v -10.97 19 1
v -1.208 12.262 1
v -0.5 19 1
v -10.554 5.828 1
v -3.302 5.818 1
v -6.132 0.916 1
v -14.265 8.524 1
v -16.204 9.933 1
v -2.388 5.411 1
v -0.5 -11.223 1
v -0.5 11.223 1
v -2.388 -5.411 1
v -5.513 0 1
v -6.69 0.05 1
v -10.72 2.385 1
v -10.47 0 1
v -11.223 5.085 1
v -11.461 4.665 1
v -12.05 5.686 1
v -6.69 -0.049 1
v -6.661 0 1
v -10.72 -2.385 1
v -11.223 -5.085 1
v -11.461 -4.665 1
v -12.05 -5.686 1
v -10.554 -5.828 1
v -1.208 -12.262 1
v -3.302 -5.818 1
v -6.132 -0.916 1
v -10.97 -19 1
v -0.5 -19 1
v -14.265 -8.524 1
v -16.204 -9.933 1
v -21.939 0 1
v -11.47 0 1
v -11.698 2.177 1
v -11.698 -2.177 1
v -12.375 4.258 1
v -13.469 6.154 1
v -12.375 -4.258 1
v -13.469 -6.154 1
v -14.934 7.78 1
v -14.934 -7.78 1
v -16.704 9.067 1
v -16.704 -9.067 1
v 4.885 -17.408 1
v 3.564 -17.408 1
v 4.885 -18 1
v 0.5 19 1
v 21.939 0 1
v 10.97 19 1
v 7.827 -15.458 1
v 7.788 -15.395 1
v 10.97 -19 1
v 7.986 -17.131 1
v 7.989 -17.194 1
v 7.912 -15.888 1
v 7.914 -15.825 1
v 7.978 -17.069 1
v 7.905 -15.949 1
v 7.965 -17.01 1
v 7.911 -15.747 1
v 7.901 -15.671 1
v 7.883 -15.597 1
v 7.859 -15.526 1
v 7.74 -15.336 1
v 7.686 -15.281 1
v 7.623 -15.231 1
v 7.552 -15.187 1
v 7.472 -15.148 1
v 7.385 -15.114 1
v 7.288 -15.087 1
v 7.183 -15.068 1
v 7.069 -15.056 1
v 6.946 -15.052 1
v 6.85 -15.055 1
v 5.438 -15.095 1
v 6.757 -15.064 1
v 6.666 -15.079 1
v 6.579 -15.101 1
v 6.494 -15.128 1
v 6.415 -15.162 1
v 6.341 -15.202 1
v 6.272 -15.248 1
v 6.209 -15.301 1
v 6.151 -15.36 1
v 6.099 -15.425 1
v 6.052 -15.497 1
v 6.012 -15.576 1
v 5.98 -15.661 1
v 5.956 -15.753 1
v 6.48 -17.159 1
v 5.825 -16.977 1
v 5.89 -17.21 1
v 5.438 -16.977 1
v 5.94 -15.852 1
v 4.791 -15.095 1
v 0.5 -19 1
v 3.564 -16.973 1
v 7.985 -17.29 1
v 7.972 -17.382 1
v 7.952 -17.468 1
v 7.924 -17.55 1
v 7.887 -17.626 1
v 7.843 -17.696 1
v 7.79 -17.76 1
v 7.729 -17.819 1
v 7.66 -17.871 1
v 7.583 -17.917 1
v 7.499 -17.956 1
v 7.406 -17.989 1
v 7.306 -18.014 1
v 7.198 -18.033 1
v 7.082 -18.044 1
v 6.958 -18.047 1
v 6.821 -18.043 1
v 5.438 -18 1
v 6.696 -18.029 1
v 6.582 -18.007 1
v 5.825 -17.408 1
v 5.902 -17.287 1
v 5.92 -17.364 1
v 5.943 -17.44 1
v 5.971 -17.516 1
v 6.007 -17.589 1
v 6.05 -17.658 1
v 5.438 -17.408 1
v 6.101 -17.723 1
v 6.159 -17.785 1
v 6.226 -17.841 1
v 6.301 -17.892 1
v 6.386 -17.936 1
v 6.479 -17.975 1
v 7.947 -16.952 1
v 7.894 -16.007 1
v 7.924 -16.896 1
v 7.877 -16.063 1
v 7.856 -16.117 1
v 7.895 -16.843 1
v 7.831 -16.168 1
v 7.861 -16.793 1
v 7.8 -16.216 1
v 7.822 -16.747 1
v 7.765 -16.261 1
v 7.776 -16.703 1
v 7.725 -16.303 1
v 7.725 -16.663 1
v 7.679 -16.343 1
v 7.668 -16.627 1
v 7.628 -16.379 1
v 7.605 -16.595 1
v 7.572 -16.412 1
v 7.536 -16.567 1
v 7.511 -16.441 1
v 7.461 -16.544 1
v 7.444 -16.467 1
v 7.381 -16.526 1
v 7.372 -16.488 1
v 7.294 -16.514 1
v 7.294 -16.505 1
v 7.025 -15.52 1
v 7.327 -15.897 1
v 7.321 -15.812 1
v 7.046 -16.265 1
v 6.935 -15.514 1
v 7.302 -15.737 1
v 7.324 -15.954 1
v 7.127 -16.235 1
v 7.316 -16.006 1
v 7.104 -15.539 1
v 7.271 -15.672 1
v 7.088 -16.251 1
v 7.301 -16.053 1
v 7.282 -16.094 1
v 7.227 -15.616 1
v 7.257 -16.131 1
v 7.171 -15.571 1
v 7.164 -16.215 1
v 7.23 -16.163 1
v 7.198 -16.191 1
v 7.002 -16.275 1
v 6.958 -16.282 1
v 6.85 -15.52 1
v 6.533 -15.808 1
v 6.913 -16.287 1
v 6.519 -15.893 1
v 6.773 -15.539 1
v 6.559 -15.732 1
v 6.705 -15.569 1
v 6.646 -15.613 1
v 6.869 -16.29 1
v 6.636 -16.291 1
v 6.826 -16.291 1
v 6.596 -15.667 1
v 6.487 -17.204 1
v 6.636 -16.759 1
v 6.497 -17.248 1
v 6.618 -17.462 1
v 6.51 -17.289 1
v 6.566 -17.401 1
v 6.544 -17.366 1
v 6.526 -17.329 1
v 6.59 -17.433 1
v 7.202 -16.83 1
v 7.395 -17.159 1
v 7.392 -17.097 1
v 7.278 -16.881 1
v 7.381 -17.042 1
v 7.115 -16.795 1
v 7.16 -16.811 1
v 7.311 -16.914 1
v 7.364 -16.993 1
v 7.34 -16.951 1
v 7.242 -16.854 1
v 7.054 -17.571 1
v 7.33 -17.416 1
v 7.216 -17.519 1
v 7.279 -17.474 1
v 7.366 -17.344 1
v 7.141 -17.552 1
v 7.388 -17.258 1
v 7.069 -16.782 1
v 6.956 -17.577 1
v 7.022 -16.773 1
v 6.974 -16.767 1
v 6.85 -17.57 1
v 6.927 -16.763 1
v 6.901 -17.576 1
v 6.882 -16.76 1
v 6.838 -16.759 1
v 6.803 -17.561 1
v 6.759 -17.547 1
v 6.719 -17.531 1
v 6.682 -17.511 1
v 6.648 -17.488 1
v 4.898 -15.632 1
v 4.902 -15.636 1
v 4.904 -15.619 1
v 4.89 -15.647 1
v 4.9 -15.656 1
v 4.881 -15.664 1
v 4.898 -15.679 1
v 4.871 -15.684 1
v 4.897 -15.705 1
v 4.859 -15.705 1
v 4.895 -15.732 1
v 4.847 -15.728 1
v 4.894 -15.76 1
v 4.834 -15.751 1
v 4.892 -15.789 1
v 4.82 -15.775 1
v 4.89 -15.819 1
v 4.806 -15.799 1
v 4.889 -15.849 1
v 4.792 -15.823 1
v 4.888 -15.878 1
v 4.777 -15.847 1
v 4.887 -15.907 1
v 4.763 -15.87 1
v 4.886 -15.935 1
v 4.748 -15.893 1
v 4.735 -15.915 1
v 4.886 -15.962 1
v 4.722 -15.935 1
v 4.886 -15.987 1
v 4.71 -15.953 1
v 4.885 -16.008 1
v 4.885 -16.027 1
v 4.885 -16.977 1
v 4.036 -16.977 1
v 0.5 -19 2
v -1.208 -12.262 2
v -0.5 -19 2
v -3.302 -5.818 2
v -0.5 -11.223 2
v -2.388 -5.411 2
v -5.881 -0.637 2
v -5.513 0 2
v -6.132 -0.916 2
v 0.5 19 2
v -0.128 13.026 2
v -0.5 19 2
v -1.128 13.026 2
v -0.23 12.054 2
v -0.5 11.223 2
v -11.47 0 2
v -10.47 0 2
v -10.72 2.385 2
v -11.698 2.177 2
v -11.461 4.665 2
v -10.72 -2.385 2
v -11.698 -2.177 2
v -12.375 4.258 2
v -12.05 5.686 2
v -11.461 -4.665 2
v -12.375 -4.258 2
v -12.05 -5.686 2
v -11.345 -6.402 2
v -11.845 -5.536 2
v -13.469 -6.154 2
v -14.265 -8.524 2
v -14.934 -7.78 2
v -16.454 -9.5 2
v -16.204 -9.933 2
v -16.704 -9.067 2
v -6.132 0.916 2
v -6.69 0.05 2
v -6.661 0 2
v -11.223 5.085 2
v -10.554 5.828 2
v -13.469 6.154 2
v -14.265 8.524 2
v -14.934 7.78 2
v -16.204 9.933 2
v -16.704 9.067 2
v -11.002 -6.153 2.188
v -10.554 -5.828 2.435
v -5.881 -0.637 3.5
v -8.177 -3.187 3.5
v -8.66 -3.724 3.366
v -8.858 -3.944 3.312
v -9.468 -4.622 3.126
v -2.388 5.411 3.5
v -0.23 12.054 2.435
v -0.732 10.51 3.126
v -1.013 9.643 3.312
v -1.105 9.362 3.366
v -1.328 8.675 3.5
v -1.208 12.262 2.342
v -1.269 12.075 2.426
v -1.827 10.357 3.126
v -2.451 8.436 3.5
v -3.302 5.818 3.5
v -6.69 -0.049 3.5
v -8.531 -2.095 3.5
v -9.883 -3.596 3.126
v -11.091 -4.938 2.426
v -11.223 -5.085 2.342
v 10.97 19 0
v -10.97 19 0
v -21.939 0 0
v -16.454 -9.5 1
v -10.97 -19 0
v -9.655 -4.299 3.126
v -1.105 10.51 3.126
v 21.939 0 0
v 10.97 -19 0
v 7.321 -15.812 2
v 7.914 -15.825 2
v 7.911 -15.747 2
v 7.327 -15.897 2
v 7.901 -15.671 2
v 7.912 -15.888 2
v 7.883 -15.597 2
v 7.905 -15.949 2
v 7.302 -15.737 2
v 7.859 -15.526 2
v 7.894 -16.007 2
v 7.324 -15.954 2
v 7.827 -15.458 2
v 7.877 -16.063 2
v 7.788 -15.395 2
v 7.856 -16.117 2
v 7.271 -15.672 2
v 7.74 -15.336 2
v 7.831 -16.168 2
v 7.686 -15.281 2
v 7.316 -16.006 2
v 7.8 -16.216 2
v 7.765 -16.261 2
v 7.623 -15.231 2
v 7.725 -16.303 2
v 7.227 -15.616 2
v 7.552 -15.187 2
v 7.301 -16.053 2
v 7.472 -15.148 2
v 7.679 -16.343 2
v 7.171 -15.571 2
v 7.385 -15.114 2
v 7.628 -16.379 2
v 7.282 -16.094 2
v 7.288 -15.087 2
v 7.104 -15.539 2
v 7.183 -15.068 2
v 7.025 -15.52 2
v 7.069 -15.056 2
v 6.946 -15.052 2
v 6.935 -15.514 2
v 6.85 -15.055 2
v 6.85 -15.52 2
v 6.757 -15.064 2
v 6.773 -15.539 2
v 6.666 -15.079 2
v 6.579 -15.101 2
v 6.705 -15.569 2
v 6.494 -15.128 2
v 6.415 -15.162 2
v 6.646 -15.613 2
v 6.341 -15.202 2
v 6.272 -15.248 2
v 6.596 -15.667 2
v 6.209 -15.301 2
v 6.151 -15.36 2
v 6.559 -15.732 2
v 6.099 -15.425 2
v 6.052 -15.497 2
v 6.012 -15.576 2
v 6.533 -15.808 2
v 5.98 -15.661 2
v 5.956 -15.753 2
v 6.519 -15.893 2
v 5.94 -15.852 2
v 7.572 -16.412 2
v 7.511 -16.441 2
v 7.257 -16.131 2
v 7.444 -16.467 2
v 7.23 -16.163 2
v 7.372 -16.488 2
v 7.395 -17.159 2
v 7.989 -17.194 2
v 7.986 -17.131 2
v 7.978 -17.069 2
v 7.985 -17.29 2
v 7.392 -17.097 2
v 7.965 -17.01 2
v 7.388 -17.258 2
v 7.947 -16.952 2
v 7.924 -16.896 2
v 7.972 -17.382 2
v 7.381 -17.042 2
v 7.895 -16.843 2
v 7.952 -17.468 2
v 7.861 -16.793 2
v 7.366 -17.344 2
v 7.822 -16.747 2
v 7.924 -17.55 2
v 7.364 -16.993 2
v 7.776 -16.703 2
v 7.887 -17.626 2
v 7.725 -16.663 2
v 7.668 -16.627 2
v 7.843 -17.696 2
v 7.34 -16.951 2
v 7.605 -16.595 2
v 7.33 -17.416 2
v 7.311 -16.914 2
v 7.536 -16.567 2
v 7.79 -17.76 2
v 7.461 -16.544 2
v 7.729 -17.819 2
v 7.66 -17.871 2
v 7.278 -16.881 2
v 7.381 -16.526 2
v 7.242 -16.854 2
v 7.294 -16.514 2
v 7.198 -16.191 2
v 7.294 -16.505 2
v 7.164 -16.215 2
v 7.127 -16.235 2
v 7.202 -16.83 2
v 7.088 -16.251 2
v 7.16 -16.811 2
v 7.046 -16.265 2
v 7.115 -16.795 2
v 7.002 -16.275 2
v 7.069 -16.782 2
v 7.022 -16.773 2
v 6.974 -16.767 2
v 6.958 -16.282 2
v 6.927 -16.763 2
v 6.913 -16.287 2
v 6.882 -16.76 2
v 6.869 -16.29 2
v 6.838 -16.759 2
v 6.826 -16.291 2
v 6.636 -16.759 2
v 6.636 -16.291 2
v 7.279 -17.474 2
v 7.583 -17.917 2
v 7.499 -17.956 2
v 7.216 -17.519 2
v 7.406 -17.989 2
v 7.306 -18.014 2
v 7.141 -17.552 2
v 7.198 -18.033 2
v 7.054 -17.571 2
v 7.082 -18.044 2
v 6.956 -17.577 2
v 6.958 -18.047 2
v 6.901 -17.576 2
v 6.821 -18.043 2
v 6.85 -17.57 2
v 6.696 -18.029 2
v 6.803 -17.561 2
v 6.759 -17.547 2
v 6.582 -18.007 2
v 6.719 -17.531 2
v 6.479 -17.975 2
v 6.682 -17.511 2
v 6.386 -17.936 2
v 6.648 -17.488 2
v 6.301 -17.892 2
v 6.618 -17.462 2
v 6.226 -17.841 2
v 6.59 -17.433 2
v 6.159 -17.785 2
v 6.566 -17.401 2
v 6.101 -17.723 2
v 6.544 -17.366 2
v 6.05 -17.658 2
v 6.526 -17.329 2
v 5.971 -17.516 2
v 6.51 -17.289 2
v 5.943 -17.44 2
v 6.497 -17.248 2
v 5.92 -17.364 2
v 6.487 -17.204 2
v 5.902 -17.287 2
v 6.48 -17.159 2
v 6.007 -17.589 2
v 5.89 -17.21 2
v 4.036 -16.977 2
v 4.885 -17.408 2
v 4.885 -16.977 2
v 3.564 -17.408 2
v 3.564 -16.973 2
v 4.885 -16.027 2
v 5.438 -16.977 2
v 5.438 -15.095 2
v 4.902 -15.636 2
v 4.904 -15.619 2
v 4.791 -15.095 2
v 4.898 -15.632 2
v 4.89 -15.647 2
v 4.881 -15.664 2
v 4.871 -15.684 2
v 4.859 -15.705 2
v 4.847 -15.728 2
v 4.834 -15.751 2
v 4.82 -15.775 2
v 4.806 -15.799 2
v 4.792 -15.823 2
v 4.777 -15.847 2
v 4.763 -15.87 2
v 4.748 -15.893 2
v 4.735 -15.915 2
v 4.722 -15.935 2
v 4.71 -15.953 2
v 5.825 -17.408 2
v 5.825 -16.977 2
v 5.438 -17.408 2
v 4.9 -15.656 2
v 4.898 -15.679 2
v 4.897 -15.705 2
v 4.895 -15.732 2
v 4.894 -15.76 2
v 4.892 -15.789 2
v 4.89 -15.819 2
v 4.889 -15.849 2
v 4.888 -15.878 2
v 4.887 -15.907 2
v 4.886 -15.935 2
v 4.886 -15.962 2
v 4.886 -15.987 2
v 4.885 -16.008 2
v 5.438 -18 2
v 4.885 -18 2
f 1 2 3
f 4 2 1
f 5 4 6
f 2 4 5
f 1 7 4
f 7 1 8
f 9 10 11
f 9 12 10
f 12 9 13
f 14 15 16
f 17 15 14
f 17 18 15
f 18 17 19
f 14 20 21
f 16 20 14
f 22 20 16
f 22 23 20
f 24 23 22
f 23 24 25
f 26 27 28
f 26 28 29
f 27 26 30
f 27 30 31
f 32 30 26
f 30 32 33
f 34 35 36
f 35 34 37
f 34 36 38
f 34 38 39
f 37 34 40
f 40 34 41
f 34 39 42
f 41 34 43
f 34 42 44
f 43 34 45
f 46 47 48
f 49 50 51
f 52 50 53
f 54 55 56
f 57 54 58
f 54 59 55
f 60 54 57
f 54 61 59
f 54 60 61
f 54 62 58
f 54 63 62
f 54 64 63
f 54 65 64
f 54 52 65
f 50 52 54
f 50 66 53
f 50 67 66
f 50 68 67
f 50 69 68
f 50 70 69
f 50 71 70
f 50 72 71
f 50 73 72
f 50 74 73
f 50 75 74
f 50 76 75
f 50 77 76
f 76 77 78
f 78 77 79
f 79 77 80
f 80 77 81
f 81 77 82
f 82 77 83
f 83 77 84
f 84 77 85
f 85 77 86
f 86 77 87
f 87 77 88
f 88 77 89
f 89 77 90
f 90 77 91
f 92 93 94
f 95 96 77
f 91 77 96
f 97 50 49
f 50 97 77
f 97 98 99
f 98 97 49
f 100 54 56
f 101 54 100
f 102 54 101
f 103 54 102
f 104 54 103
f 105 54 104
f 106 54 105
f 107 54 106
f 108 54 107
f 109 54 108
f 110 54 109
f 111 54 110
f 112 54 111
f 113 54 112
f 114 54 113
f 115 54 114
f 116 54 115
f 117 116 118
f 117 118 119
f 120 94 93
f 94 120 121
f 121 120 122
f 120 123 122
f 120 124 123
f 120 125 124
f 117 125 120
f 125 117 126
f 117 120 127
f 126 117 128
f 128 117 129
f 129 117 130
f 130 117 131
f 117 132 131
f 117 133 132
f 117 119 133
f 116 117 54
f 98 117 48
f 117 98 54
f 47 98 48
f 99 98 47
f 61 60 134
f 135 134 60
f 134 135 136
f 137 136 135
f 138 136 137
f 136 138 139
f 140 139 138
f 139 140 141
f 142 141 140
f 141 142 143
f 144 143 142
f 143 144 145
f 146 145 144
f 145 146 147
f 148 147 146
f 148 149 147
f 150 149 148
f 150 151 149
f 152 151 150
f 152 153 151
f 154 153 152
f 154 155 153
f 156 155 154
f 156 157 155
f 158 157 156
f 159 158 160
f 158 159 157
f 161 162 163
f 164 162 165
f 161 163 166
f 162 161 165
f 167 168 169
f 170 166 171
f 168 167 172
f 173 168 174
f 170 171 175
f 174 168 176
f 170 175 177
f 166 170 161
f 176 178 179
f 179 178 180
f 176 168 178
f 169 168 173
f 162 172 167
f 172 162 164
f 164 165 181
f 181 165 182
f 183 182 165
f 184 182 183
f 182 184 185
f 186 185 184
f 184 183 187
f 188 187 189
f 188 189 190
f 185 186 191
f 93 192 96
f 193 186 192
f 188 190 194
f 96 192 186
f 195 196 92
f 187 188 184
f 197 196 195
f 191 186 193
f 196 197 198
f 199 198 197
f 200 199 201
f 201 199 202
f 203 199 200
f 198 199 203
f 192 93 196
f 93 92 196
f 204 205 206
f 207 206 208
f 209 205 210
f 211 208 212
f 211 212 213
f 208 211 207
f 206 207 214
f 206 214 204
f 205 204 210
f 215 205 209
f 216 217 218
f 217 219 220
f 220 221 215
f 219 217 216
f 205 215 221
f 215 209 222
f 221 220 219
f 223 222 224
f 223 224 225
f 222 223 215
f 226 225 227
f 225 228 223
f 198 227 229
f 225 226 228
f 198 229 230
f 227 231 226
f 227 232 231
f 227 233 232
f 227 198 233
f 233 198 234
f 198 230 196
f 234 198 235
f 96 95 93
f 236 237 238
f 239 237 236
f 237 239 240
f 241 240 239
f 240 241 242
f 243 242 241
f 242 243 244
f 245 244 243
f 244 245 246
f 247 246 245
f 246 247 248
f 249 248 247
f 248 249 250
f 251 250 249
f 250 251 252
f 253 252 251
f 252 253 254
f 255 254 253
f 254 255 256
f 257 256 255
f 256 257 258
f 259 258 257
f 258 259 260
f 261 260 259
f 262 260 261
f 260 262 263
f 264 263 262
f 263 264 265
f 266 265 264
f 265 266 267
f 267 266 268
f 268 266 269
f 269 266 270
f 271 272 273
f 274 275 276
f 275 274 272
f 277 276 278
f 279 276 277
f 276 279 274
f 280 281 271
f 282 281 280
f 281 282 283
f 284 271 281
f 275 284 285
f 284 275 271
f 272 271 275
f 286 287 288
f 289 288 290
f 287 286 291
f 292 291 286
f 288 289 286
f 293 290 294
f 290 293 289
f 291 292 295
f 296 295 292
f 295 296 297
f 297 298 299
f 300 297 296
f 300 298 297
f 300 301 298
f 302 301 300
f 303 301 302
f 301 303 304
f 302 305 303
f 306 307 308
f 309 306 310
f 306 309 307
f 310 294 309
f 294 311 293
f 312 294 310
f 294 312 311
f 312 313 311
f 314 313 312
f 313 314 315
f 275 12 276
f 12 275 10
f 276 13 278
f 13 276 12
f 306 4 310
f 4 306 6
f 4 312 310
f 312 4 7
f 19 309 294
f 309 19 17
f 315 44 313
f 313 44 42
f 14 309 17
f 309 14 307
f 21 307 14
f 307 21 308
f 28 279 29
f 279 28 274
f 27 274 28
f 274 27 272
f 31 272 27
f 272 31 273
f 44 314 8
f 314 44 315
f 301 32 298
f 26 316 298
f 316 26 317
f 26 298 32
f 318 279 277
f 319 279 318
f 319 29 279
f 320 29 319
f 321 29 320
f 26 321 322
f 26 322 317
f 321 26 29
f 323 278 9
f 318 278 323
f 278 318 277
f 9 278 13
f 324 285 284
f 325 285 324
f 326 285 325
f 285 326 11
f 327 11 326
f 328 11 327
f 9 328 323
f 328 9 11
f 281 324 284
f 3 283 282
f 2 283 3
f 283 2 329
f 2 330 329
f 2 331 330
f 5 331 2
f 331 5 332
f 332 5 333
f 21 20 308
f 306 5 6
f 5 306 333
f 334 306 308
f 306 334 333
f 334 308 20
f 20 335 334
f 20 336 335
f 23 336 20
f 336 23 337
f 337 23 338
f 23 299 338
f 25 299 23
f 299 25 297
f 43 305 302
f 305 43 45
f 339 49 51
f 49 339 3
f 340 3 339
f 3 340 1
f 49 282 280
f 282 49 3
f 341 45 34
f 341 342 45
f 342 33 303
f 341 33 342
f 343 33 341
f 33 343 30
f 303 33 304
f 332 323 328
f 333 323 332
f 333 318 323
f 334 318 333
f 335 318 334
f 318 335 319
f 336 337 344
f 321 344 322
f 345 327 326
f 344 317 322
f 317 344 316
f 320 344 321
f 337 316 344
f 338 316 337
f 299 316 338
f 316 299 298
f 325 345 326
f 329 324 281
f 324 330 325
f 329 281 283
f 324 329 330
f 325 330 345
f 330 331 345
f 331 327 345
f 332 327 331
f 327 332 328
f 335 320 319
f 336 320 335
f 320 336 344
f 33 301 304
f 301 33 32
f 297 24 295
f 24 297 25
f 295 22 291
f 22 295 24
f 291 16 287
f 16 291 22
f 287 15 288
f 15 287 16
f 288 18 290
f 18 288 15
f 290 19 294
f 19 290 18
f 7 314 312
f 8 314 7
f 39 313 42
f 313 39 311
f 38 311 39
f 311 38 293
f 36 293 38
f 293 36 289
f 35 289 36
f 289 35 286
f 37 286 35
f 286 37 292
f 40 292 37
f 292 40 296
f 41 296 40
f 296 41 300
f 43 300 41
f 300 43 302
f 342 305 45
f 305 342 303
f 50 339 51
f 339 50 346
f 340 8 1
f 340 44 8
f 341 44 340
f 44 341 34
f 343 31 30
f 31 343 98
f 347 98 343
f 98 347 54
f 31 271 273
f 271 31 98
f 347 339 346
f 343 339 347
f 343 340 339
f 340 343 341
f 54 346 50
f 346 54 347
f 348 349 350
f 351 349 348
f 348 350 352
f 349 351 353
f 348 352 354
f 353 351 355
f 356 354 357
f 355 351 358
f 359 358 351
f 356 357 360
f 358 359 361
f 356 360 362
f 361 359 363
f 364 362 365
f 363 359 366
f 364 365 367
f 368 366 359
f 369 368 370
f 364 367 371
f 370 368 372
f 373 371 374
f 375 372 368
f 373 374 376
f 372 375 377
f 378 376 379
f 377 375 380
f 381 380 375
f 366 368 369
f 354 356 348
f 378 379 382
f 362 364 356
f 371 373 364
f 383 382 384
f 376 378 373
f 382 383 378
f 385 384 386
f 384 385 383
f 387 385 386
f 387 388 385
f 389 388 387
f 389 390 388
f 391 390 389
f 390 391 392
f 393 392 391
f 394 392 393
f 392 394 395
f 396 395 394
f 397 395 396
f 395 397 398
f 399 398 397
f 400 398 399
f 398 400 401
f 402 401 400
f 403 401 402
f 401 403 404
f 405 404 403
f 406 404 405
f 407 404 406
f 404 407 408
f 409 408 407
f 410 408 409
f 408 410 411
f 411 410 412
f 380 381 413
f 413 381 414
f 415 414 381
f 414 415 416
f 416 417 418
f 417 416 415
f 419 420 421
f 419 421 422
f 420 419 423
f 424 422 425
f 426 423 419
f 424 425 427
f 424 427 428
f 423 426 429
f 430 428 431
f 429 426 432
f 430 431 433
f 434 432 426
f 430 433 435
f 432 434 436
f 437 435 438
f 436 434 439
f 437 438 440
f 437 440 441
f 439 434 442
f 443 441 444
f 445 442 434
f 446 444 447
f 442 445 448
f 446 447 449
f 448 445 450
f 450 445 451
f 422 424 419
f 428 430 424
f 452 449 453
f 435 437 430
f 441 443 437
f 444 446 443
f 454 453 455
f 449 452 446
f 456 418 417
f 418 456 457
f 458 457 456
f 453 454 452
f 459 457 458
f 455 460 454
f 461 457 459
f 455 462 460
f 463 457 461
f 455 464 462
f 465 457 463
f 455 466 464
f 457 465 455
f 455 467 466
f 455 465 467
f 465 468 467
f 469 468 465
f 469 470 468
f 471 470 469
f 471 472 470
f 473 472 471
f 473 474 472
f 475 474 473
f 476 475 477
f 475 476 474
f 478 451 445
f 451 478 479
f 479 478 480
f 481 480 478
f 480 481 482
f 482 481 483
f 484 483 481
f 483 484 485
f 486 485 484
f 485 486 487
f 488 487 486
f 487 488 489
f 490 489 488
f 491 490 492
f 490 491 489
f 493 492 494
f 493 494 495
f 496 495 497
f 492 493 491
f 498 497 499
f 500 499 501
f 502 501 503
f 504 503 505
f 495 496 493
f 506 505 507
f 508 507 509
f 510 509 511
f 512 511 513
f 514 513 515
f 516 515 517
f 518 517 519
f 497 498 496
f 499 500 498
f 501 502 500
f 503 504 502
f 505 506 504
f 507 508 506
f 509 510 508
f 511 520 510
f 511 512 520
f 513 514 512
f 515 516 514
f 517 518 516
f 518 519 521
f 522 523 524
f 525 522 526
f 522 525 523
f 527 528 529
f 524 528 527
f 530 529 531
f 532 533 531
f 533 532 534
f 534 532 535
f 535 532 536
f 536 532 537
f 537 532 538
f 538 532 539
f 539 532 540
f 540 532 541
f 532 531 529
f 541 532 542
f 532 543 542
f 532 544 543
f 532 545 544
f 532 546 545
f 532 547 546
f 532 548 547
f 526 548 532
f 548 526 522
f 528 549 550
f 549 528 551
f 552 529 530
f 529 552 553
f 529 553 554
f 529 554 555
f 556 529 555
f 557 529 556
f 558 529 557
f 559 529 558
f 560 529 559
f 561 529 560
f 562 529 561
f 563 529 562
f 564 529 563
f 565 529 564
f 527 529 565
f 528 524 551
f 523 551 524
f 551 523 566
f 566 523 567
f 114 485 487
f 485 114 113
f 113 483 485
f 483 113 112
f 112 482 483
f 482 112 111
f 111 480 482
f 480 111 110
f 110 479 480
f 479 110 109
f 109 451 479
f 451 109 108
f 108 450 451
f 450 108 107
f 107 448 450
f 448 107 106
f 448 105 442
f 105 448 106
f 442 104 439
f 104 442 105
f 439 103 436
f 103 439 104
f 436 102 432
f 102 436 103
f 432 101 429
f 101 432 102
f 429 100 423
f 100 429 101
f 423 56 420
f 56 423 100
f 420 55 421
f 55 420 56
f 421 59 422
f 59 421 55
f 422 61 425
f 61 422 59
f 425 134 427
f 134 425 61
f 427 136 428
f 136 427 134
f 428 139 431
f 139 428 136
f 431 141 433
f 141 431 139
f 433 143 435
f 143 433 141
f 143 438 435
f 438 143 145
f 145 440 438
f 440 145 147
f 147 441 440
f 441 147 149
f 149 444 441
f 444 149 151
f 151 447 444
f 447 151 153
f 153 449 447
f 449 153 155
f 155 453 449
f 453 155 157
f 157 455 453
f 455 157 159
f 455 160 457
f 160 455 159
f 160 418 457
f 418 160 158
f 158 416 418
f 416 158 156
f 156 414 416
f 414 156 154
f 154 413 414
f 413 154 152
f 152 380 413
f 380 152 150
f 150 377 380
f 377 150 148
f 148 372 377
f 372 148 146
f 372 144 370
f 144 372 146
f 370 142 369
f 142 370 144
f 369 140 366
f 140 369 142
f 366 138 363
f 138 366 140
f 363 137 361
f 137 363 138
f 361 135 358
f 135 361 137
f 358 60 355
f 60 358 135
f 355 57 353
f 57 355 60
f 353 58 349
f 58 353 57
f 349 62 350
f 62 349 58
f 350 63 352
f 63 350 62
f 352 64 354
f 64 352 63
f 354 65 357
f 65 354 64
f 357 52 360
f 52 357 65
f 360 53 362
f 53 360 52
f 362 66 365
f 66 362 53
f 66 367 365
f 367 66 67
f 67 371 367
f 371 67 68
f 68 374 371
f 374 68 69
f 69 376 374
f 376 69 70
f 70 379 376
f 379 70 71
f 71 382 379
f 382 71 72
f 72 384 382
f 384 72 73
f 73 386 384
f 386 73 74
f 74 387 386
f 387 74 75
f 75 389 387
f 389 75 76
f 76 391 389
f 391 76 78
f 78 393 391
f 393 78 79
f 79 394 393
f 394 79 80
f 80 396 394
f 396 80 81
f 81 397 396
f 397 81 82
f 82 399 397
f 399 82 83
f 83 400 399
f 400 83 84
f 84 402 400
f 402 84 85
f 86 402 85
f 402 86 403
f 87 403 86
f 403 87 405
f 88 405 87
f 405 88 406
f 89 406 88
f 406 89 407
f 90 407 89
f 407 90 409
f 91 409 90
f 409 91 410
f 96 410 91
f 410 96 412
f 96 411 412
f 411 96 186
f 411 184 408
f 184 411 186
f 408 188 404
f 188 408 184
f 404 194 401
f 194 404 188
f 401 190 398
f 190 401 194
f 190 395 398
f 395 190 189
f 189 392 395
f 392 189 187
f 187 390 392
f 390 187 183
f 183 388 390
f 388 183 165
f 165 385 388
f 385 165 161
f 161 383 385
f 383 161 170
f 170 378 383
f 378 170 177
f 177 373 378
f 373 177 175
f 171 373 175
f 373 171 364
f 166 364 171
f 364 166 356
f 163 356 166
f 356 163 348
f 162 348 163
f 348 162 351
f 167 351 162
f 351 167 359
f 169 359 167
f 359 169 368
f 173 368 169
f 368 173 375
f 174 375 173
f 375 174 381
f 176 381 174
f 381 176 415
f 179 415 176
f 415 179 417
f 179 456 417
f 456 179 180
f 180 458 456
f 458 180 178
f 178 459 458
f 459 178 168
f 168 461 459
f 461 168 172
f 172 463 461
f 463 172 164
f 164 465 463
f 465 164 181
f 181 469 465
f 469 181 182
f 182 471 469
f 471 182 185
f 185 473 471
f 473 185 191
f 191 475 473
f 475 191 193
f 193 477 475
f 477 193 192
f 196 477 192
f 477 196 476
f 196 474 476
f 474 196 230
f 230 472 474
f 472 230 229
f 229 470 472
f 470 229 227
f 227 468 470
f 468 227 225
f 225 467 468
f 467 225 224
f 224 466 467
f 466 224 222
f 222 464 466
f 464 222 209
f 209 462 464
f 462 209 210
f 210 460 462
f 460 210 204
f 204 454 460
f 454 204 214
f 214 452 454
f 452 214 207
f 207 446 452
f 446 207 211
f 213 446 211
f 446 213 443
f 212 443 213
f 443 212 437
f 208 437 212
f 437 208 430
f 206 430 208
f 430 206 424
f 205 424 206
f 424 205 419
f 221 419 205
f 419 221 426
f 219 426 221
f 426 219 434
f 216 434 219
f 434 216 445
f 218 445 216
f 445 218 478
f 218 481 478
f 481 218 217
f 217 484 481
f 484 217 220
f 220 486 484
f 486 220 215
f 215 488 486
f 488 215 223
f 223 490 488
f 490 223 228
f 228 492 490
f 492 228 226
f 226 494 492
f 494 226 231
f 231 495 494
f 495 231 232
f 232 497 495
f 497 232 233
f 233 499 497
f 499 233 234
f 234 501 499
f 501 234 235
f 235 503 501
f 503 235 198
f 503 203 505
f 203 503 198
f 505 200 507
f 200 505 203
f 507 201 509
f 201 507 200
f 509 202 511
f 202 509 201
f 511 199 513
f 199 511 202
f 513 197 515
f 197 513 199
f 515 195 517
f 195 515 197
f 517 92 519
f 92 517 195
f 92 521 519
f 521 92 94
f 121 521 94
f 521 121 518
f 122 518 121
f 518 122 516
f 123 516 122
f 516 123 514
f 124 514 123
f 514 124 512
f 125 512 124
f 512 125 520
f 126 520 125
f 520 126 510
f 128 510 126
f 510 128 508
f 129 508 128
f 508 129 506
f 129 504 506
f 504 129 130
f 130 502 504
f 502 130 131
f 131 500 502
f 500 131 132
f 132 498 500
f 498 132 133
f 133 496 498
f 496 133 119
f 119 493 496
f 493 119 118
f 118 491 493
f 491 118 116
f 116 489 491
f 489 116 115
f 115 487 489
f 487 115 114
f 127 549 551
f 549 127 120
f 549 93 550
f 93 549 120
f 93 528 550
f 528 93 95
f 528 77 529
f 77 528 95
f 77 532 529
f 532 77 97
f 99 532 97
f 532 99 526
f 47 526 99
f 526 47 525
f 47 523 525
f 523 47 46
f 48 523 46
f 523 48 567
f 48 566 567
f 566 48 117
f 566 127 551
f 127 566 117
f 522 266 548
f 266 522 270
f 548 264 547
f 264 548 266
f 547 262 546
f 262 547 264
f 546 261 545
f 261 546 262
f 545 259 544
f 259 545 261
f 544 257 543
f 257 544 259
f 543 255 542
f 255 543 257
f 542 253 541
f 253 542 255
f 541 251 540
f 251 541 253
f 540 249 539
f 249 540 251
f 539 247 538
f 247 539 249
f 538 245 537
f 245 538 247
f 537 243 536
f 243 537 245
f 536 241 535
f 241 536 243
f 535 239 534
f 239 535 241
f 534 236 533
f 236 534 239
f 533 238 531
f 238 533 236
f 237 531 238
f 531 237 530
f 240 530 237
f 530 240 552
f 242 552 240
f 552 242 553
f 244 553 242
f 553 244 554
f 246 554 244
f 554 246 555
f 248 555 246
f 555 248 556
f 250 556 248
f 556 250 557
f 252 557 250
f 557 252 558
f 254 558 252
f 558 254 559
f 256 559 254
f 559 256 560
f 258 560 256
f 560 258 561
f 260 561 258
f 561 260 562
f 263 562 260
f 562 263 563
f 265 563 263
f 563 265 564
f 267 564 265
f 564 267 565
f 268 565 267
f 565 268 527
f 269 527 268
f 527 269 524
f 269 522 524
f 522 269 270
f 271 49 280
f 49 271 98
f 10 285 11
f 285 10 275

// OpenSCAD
include <../Scripts/18xx tiles basic functions.scad>
hex("Brown");
put_tilenr("43");
light_curve(r=4);
light_curve_bridge(r=3);
sharp_curve(r=4);
straight_line();
